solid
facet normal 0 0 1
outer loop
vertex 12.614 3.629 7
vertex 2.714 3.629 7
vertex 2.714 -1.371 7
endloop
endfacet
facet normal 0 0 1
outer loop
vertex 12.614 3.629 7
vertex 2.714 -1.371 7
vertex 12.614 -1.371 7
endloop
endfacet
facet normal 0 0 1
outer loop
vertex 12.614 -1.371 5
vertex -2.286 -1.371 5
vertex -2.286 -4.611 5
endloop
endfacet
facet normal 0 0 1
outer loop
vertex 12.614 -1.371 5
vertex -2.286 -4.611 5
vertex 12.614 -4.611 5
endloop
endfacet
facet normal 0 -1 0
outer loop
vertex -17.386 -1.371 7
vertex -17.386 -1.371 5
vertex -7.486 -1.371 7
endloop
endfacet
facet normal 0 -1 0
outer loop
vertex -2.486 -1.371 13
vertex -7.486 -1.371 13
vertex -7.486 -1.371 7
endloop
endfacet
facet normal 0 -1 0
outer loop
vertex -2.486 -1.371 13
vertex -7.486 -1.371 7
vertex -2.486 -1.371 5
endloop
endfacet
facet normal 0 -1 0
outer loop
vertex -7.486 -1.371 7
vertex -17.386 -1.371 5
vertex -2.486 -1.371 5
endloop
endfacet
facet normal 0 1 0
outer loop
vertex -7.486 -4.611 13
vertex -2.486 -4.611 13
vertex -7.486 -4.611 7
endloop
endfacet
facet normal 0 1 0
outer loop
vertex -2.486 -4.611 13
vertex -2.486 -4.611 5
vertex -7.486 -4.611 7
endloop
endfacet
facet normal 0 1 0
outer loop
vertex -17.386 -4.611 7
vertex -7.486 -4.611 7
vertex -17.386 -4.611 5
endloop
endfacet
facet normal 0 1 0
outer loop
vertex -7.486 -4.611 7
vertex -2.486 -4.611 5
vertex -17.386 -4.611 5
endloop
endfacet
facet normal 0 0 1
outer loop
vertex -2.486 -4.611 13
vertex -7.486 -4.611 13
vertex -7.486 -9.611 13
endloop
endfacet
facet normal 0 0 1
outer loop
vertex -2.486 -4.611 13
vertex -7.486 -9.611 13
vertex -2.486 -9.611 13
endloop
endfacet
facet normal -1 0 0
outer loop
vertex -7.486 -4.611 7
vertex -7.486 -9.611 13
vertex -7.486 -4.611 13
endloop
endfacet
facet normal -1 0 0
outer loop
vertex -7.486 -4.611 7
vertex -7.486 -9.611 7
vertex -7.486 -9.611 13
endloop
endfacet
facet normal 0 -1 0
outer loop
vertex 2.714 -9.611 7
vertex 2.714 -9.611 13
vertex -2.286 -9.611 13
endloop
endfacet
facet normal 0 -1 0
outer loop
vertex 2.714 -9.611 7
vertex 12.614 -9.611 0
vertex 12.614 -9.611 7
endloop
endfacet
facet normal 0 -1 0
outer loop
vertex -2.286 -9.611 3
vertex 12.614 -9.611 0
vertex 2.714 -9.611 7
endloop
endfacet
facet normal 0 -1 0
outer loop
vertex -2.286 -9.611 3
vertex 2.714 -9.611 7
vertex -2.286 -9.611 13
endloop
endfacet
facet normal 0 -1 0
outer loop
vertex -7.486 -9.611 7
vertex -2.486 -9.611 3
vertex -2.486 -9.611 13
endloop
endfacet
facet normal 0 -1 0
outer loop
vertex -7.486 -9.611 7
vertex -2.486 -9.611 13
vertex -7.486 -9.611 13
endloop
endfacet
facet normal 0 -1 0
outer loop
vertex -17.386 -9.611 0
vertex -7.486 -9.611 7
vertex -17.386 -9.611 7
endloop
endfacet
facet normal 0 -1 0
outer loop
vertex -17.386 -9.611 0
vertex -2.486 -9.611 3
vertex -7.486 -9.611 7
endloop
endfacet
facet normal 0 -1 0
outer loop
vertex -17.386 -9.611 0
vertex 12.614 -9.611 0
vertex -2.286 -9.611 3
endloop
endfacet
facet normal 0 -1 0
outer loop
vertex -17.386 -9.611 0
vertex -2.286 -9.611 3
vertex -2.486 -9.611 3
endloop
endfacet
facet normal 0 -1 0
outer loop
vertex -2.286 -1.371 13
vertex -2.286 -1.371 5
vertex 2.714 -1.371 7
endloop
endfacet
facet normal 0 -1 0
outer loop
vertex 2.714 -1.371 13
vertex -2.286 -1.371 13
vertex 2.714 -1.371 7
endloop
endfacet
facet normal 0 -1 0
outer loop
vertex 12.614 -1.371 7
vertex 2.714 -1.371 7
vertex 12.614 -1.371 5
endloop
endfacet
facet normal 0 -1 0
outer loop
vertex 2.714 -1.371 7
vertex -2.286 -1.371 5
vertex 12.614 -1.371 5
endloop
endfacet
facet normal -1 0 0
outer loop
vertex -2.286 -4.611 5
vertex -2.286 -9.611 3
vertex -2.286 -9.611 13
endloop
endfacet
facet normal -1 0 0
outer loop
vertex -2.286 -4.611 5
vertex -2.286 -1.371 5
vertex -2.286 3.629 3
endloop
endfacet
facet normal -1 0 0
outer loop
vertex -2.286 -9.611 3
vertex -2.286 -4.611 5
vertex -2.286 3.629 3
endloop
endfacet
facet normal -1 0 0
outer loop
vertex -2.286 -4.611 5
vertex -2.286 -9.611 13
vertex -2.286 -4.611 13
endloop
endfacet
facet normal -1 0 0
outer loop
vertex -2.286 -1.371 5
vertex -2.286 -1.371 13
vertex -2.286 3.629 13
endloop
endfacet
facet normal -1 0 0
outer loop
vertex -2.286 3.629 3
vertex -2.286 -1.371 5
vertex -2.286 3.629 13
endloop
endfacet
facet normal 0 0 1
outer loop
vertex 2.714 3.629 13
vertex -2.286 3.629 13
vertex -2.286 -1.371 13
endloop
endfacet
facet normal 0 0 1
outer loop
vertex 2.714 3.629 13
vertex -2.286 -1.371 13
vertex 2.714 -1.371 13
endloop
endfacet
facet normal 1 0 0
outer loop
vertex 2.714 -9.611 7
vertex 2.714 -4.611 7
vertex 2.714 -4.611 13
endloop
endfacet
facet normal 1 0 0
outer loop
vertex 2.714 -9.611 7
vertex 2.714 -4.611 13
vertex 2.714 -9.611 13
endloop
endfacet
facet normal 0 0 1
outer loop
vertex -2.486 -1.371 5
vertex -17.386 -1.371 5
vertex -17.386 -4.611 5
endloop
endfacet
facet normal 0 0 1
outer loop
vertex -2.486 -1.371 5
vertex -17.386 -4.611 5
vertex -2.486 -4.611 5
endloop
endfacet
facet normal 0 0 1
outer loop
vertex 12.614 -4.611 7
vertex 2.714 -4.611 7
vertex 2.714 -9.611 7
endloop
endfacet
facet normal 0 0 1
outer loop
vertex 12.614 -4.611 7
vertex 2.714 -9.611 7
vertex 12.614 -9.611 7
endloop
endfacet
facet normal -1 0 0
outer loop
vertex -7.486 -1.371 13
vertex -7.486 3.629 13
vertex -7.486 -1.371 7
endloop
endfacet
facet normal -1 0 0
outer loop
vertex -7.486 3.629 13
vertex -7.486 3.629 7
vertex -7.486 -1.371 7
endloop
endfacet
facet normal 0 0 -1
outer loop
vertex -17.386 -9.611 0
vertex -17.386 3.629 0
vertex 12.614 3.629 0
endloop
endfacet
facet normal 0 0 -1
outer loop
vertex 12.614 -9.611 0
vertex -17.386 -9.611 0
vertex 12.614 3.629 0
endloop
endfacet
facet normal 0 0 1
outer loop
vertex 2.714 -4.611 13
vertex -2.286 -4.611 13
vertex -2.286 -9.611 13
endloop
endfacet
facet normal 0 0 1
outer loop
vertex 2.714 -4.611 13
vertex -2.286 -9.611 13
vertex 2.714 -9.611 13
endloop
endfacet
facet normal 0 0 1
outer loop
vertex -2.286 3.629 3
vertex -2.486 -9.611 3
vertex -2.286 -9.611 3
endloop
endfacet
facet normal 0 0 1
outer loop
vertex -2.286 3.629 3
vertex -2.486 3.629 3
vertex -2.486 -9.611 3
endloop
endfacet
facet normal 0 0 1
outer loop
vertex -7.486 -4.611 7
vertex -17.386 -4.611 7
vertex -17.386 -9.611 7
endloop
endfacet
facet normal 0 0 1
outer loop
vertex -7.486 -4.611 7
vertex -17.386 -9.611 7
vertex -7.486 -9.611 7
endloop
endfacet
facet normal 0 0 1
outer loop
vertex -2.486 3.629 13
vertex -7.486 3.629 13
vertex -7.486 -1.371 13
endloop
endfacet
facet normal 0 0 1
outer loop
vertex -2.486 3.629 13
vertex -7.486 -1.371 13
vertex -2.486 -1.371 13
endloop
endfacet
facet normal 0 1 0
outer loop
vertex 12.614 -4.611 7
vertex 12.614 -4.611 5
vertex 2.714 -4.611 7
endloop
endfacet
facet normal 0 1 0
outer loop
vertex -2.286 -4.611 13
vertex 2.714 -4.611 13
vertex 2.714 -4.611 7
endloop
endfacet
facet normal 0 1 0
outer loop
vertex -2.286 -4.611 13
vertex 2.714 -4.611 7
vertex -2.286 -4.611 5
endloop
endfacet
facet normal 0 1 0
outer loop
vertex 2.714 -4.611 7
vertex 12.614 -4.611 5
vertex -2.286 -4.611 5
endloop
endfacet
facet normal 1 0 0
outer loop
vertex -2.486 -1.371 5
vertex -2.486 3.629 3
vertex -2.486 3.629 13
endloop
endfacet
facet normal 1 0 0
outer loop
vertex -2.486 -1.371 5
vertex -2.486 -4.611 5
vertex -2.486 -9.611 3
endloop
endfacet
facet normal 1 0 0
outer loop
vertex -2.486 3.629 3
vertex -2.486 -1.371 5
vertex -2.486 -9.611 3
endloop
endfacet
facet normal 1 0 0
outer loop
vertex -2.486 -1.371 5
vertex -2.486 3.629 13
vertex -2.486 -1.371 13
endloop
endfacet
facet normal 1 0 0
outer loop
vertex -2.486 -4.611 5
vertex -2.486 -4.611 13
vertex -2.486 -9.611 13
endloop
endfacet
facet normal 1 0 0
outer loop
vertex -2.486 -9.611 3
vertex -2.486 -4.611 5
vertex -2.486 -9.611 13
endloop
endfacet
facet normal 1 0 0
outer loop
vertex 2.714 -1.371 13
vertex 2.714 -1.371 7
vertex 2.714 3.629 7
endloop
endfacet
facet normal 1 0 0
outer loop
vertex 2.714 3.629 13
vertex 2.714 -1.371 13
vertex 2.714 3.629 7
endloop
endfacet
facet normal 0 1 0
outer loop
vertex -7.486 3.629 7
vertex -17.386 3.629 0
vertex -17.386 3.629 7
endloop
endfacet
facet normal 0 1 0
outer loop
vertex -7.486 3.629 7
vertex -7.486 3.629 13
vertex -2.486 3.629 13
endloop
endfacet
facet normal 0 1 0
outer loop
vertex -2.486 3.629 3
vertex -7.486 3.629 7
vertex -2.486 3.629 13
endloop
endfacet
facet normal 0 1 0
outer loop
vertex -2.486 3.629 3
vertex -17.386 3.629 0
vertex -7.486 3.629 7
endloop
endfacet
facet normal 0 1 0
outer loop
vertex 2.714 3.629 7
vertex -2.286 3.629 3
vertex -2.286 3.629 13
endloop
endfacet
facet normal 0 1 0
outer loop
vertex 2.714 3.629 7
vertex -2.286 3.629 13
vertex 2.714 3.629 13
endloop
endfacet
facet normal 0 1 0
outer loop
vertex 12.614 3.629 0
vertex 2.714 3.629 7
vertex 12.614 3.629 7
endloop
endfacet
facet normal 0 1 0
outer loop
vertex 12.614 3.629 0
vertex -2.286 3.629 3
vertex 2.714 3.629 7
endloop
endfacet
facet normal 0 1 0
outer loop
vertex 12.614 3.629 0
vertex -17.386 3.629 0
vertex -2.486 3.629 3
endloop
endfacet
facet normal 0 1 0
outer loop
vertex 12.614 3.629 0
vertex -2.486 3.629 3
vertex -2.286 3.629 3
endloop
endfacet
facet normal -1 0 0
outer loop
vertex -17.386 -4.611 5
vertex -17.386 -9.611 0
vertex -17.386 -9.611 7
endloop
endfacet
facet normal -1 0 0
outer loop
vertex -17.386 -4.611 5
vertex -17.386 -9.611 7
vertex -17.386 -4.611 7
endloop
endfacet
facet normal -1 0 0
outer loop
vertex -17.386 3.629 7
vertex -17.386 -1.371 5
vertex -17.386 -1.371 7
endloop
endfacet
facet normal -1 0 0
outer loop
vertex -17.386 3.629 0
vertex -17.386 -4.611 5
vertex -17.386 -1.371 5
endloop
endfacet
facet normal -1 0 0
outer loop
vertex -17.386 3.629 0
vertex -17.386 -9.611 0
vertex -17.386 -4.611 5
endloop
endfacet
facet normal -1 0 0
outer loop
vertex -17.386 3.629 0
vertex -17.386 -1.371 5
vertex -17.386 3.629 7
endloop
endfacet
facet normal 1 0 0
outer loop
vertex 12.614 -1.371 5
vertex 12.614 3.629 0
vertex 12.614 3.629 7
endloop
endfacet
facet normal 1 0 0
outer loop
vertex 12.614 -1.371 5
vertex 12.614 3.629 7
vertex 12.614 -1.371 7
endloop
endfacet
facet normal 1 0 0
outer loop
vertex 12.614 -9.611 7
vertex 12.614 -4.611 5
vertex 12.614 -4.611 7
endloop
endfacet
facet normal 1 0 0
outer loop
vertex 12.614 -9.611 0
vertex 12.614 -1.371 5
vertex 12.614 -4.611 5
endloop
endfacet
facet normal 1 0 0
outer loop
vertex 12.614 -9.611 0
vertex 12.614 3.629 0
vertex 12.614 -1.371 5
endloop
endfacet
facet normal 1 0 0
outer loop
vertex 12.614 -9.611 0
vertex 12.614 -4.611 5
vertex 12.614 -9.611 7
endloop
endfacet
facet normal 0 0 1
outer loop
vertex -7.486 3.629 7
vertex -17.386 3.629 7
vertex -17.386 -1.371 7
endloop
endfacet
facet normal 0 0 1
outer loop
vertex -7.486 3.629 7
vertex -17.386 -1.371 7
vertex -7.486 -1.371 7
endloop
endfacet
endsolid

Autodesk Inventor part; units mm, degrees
ref_plane "YZ Plane" through (0, 0, 0) normal (1, 0, 0) x (0, 1, 0)
ref_plane "XZ Plane" through (0, 0, 0) normal (0, 1, 0) x (-1, 0, 0)
ref_plane "XY Plane" through (0, 0, 0) normal (0, 0, 1) x (1, 0, 0)
sketch "Sketch1" plane through (0, 0, 0) normal (0, 0, 1) x (1, 0, 0)
  line L0 (-17.386, 3.6293) -> (12.614, 3.6293)
  line L1 (12.614, 3.6293) -> (12.614, -9.6107)
  line L2 (12.614, -9.6107) -> (-17.386, -9.6107)
  line L3 (-17.386, -9.6107) -> (-17.386, 3.6293)
  point P0 (0, 0)
  dimension "d0" = 30
  dimension "d1" = 13.24
extrude "Extrusion1" add sketch "Sketch1" along normal blind 5
sketch "Sketch2" plane through (0, 0, 5) normal (0, 0, 1) x (1, 0, 0)
  line L0 (12.614, 3.6293) -> (-17.386, 3.6293) projected
  line L1 (-17.386, 3.6293) -> (-17.386, -9.6107) projected
  line L2 (12.614, 3.6293) -> (-17.386, 3.6293)
  line L3 (-17.386, 3.6293) -> (-17.386, -1.3707)
  line L4 (-17.386, -1.3707) -> (12.614, -1.3707)
  line L5 (12.614, -1.3707) -> (12.614, 3.6293)
  line L6 (12.614, -9.6107) -> (12.614, 3.6293) projected
  line L7 (-17.386, -9.6107) -> (12.614, -9.6107)
  line L8 (12.614, -9.6107) -> (12.614, -4.6107)
  line L9 (12.614, -4.6107) -> (-17.386, -4.6107)
  line L10 (-17.386, -4.6107) -> (-17.386, -9.6107)
  point P0 (0, 0)
  dimension "d4" = 5
  dimension "d5" = 5
extrude "Extrusion2" add sketch "Sketch2" along normal blind 2 contours L5 L4 L1 L0 | L6 L7 L1 L9
sketch "Sketch3" plane through (0, 0, 7) normal (0, 0, 1) x (1, 0, 0)
  line L0 (-2.386, 3.6293) -> (-2.386, -9.6107) construction
  line L1 (2.714, 3.6293) -> (-7.486, 3.6293)
  line L2 (-7.486, 3.6293) -> (-7.486, -1.3707)
  line L3 (-7.486, -1.3707) -> (2.714, -1.3707)
  line L4 (2.714, -1.3707) -> (2.714, 3.6293)
  line L5 (12.614, -2.9907) -> (-17.386, -2.9907) construction
  line L6 (2.714, -9.6107) -> (-7.486, -9.6107)
  line L7 (-7.486, -9.6107) -> (-7.486, -4.6107)
  line L8 (-7.486, -4.6107) -> (2.714, -4.6107)
  line L9 (2.714, -4.6107) -> (2.714, -9.6107)
  point P0 (0, 0)
  point P1 (12.614, -9.6107)
  point P2 (-17.386, -9.6107)
  dimension "d8" = 10.2
extrude "Extrusion3" add sketch "Sketch3" along normal blind 6
sketch "Sketch4" plane through (0, 0, 13) normal (0, 0, 1) x (1, 0, 0)
  line L0 (2.714, 3.6293) -> (-7.486, 3.6293) projected
  line L1 (-2.386, 3.6293) -> (-2.386, -9.6107) construction
  line L2 (-7.486, -9.6107) -> (2.714, -9.6107) projected
  line L3 (-2.286, 3.6293) -> (-2.486, 3.6293)
  line L4 (-2.486, 3.6293) -> (-2.486, -9.6107)
  line L5 (-2.486, -9.6107) -> (-2.286, -9.6107)
  line L6 (-2.286, -9.6107) -> (-2.286, 3.6293)
  point P0 (0, 0)
  dimension "d11" = 0.2
extrude "Extrusion4" cut sketch "Sketch4" against normal blind 10
properties part number "BalsaBoi"
